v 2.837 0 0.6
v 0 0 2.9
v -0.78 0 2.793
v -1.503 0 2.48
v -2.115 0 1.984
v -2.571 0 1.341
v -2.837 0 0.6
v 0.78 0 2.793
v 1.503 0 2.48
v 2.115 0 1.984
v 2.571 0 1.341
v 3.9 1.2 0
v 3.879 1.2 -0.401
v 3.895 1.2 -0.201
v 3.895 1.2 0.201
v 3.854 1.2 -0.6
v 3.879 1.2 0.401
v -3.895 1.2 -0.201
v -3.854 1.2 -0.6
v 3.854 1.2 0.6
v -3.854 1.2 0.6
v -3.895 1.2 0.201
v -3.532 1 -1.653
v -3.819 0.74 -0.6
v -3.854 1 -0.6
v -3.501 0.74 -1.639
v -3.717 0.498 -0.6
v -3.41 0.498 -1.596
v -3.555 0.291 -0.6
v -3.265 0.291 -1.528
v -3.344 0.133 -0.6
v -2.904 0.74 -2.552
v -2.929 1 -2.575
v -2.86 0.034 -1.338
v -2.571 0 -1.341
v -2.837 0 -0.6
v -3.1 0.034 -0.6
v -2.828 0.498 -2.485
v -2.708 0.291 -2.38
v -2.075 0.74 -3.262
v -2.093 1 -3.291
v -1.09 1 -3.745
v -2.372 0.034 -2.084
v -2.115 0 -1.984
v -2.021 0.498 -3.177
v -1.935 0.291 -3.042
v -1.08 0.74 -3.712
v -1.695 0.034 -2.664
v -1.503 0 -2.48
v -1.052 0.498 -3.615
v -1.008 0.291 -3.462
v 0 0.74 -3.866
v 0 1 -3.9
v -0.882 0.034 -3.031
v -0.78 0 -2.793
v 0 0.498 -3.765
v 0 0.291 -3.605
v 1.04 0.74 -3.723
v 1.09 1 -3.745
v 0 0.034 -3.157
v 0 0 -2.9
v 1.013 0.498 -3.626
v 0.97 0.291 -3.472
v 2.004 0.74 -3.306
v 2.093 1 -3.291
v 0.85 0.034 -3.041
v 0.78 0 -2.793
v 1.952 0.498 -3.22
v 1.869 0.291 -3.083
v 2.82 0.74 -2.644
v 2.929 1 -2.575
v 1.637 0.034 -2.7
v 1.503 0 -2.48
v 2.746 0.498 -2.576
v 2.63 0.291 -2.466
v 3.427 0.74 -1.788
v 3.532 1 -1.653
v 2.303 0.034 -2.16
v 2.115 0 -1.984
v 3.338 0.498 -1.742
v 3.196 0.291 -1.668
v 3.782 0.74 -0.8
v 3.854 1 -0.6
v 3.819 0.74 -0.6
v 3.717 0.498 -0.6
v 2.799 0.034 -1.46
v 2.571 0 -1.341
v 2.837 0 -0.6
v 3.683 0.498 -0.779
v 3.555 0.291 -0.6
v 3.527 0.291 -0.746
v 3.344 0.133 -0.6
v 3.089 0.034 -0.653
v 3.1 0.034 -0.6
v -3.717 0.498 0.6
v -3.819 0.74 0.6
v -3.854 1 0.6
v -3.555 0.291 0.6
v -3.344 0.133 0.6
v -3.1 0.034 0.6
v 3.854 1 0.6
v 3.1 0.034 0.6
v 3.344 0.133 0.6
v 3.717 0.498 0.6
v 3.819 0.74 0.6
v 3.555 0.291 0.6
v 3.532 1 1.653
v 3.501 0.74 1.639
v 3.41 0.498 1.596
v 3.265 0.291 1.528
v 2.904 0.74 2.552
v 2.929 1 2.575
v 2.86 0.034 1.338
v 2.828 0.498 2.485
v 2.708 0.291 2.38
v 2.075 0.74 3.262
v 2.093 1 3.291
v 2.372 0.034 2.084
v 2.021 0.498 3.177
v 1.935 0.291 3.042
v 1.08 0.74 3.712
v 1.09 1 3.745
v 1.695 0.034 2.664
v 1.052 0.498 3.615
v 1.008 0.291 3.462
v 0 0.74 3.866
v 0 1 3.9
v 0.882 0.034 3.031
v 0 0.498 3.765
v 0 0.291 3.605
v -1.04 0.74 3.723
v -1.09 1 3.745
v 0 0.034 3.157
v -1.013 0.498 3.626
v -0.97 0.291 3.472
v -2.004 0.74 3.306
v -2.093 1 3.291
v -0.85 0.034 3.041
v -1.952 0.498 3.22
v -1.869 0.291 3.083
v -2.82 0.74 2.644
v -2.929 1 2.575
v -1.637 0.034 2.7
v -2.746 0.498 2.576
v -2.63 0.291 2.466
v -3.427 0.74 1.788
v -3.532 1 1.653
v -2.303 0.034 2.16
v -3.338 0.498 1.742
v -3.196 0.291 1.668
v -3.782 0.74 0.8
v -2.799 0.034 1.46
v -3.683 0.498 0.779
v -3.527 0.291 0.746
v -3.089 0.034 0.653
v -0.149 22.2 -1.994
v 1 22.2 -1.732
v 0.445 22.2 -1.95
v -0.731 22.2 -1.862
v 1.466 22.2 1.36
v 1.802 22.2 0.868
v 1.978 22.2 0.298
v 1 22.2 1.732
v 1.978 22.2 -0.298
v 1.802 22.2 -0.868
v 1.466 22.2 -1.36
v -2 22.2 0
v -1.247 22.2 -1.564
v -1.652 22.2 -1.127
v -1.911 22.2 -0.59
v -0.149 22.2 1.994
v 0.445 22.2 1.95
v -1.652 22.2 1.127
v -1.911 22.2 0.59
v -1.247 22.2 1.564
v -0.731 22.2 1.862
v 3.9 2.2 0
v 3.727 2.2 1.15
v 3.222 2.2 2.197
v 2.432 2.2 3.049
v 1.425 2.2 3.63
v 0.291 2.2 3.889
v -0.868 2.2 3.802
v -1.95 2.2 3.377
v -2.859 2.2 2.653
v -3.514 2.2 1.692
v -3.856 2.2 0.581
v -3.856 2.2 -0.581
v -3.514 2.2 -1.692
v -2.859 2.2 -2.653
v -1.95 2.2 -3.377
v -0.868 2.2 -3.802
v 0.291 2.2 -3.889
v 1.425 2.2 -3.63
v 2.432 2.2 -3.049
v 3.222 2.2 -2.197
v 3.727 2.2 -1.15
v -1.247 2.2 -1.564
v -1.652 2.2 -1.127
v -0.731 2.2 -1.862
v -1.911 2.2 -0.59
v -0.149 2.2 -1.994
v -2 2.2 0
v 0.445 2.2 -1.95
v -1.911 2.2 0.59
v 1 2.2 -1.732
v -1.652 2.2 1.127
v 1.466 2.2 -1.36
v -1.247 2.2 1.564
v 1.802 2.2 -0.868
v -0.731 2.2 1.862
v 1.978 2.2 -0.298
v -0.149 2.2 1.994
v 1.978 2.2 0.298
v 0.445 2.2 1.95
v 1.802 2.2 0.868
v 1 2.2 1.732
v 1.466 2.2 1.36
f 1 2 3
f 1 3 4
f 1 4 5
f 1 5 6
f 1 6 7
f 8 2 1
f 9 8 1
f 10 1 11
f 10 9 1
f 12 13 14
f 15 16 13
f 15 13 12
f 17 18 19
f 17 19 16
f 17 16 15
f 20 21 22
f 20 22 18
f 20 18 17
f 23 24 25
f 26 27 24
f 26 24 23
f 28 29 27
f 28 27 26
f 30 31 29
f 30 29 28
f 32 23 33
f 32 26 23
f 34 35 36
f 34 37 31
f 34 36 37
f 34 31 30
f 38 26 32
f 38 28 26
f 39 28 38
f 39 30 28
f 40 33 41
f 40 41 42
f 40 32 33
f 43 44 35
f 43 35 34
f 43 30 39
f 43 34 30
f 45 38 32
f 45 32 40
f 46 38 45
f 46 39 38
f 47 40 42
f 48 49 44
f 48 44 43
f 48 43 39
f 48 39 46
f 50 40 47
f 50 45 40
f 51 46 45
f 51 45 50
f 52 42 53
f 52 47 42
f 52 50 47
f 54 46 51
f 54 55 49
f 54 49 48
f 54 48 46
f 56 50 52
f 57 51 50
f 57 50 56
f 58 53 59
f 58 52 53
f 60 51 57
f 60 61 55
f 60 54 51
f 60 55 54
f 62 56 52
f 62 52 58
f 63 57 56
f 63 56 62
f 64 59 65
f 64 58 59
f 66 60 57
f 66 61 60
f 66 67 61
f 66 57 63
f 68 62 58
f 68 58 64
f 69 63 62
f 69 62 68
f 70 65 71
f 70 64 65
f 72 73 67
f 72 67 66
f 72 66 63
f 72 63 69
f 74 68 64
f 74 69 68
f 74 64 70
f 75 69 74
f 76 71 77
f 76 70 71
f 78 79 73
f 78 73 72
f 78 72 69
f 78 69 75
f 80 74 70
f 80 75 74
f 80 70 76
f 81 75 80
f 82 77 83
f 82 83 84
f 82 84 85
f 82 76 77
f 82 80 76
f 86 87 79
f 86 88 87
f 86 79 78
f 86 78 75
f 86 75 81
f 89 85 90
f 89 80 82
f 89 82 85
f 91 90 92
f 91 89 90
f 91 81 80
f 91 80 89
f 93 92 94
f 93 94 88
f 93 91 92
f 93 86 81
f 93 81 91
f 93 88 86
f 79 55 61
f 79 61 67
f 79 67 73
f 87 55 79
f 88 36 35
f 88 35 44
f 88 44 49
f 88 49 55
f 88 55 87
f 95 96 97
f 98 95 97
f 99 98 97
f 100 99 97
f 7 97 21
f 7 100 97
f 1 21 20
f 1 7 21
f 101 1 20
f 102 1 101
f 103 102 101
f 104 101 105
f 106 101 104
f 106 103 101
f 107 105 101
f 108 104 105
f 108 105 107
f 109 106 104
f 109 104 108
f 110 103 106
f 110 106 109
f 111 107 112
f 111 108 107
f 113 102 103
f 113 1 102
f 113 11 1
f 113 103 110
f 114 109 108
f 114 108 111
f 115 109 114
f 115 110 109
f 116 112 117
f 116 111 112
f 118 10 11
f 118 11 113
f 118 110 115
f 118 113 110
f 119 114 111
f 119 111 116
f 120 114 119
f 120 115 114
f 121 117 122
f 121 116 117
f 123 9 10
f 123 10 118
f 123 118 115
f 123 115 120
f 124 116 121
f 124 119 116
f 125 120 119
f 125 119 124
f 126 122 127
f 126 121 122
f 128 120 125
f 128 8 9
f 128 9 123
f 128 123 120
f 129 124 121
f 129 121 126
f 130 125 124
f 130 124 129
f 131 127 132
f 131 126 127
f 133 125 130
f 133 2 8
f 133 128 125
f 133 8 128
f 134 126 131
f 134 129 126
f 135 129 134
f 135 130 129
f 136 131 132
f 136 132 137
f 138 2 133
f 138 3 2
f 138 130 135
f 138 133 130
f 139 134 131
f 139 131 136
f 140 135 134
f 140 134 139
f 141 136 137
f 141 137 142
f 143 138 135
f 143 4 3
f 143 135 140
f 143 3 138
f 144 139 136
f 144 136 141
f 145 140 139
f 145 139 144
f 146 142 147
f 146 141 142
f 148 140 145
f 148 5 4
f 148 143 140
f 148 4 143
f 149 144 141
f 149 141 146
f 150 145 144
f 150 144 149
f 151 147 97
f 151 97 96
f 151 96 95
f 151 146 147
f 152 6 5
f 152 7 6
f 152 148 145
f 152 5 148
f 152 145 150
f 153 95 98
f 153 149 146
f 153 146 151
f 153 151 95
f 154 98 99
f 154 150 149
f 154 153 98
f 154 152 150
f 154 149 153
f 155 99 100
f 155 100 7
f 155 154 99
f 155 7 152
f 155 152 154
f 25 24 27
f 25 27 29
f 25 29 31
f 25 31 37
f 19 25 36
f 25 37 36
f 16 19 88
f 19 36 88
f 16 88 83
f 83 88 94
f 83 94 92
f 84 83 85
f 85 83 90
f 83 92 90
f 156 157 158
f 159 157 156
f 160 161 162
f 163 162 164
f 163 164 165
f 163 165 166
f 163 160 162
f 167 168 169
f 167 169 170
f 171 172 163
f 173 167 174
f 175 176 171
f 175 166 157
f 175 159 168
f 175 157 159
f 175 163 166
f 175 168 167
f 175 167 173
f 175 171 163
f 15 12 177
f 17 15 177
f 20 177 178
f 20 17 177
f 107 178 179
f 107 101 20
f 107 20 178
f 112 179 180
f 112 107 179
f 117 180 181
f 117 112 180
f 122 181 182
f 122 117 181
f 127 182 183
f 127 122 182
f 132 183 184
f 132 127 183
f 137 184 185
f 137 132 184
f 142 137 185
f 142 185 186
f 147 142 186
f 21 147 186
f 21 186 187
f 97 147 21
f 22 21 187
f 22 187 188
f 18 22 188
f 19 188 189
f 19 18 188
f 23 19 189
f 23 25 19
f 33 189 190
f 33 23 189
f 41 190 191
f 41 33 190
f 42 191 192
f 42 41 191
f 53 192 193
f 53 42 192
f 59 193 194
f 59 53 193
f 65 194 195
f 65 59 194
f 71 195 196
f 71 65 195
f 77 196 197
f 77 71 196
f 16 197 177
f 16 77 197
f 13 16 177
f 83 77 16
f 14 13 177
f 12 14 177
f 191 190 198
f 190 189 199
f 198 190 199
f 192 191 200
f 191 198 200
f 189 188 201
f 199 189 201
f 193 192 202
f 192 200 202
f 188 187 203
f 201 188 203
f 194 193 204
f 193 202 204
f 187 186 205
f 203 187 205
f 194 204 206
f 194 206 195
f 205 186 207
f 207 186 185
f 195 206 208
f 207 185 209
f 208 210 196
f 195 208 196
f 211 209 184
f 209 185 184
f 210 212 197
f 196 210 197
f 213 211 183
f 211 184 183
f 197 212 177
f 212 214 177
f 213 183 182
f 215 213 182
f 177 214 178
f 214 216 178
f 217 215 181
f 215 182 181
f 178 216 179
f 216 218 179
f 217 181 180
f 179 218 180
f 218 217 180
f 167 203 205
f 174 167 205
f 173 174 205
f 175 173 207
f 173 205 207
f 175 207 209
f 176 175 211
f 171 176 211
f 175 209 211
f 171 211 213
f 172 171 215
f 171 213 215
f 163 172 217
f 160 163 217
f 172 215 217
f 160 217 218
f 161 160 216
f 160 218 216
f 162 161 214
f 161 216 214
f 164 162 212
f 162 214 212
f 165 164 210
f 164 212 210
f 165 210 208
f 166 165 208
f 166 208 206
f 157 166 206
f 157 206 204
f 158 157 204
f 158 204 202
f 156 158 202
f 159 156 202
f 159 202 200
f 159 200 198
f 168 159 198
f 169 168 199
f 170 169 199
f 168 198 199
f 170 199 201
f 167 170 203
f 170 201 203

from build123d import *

# Parameters (mm, degrees)
F0_R     = 3.9
F1_DEPTH = 2.2
F2_R     = 1
F3_W     = 8
F3_H     = 1.2
F4_DEPTH = 1.2
F5_R     = 2
F6_DEPTH = 20


with BuildPart() as f1:
    # F0 (on Front) → F1 (new body)
    with BuildSketch(Plane.XZ):
        Circle(F0_R)
    extrude(amount=-F1_DEPTH)

    # F2
    f2_edges = [f1.edges().sort_by_distance(p)[0] for p in [
        (-3.9, 0, 0),
    ]]
    fillet(f2_edges, radius=F2_R)

    # F3 (on face) → F4 (cut)
    with BuildSketch(Plane.XZ):
        Rectangle(F3_W, F3_H)
    extrude(amount=-F4_DEPTH, mode=Mode.SUBTRACT)

    # F5 (on face) → F6 (join)
    with BuildSketch(Plane(origin=(0, 2.2, 0), x_dir=(-1, 0, 0), z_dir=(0, 1, 0))):
        Circle(F5_R)
    extrude(amount=F6_DEPTH)


solid = f1.part
